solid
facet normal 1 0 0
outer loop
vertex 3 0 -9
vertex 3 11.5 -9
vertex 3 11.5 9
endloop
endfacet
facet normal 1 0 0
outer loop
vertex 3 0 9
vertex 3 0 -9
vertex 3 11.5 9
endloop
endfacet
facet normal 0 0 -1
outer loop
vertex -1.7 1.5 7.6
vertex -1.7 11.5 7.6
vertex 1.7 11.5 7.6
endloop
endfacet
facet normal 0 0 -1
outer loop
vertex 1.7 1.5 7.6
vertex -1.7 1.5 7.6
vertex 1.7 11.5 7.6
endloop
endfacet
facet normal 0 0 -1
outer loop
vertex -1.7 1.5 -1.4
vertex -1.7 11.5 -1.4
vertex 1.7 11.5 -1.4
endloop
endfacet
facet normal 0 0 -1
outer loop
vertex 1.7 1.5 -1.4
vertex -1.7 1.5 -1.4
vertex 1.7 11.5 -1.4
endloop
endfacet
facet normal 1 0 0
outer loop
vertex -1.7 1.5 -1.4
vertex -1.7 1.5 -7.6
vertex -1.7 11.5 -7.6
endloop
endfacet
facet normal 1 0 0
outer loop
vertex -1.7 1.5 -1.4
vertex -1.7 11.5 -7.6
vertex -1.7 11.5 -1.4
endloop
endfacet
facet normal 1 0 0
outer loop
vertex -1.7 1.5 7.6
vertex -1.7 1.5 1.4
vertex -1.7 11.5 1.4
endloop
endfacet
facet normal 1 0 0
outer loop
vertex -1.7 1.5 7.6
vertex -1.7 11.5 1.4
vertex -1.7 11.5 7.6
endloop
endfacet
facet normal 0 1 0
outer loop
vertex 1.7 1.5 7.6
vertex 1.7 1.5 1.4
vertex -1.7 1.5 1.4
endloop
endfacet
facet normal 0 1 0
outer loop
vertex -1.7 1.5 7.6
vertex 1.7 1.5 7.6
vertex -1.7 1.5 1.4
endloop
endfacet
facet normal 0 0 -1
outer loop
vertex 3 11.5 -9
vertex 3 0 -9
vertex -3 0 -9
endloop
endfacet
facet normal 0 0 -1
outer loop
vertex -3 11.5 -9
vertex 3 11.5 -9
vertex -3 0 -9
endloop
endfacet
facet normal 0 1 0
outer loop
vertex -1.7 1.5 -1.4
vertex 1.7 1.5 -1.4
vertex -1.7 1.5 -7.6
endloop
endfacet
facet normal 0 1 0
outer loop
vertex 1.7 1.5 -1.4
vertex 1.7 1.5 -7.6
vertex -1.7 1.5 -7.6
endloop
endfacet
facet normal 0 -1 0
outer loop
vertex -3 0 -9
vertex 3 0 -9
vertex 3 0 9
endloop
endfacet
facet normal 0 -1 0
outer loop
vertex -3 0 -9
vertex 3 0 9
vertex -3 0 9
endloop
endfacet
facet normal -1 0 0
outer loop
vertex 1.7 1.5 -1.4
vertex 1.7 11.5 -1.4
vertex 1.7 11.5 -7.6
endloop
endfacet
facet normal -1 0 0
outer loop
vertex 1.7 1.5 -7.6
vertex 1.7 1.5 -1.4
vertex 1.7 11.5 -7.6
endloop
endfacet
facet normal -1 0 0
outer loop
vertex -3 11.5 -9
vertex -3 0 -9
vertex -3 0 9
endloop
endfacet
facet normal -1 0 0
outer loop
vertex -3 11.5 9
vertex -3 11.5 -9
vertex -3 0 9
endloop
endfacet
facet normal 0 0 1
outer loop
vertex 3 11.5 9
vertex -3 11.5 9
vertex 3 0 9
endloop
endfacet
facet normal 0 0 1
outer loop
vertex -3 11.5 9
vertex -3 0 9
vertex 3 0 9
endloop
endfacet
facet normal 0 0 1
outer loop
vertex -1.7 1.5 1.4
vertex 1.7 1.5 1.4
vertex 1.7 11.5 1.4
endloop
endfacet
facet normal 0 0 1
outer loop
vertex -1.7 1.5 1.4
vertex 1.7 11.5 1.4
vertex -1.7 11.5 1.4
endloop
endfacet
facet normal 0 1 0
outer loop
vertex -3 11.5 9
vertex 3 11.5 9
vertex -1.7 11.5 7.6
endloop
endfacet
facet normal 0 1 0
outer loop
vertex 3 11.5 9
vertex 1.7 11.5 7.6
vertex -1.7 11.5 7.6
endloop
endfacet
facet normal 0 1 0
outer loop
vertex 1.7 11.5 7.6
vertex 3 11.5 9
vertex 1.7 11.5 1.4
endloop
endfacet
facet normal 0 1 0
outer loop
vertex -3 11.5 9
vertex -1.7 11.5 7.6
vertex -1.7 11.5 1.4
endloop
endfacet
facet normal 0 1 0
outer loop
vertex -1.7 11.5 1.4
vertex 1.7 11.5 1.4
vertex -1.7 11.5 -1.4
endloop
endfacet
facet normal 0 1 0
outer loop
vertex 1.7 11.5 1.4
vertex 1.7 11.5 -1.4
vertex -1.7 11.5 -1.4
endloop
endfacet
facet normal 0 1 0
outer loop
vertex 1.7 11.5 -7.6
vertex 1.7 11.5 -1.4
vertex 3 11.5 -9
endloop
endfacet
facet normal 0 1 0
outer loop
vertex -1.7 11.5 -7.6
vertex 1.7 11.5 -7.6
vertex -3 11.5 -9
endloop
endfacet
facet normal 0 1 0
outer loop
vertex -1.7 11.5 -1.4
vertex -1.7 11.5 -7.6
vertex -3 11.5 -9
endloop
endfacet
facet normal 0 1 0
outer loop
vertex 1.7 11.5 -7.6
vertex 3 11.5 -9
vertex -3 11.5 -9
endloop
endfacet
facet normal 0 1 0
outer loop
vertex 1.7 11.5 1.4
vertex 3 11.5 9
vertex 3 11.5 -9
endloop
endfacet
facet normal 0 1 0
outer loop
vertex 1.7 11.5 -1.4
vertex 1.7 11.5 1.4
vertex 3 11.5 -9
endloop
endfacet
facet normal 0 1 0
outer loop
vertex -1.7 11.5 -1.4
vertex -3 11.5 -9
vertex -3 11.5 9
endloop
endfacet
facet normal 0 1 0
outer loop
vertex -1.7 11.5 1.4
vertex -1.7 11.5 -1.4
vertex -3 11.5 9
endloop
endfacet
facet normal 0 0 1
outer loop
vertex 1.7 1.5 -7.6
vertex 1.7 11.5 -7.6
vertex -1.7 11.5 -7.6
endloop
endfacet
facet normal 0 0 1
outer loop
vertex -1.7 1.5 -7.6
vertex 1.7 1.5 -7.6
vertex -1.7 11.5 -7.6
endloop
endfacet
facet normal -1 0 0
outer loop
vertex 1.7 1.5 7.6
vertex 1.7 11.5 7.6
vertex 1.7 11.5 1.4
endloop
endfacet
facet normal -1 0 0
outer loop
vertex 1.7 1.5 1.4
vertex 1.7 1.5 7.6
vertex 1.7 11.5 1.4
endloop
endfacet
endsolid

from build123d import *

# Parameters (mm, degrees)
BOSS_EXTRUDE1_DEPTH = 1.5
BOSS_EXTRUDE5_DEPTH = 10
SKETCH2_W           = 2.8
SKETCH2_H           = 2.8
BOSS_EXTRUDE2_DEPTH = 10
SKETCH4_W           = 6
SKETCH4_H           = 6
CUT_EXTRUDE1_DEPTH  = 12.5
BOSS_EXTRUDE6_DEPTH = 11.5
SKETCH8_W           = 6
SKETCH8_H           = 6
CUT_EXTRUDE3_DEPTH  = 12.5
BOSS_EXTRUDE8_DEPTH = 10


with BuildPart() as part:
    # Sketch1 → Boss-Extrude1 (new body)
    with BuildSketch(Plane(origin=(0, 0, 0), x_dir=(1, 0, 0), z_dir=(0, 1, 0))):
        Polygon((-3, 3), (-3, 9), (3, 9), (3, 3), (9, 3), (9, -3), (3, -3), (3, -9), (-3, -9), (-3, -3), (-9, -3), (-9, 3), align=None)
    extrude(amount=BOSS_EXTRUDE1_DEPTH)

    # Sketch3 → Boss-Extrude5 (add)
    with BuildSketch(Plane(origin=(0, 1.5, 0), x_dir=(1, 0, 0), z_dir=(0, 1, 0))):
        Polygon((-3, 3), (-9, 3), (-9, -3), (-3, -3), (-3, -9), (3, -9), (3, -3), (9, -3), (9, 3), (3, 3), (3, 9), (-3, 9), align=None)
        Polygon((-1.7, 1.7), (-7.6, 1.7), (-7.6, -1.7), (-1.7, -1.7), (-1.7, -7.6), (1.7, -7.6), (1.7, -1.7), (7.6, -1.7), (7.6, 1.7), (1.7, 1.7), (1.7, 7.6), (-1.7, 7.6), align=None, mode=Mode.SUBTRACT)
    extrude(amount=BOSS_EXTRUDE5_DEPTH)

    # Sketch2 → Boss-Extrude2 (add)
    with BuildSketch(Plane(origin=(0, 1.5, 0), x_dir=(1, 0, 0), z_dir=(0, 1, 0))):
        Rectangle(SKETCH2_W, SKETCH2_H)
    extrude(amount=BOSS_EXTRUDE2_DEPTH)

    # Sketch4 → Cut-Extrude1 (cut, through all)
    with BuildSketch(Plane(origin=(0, 11.5, 0), x_dir=(1, 0, 0), z_dir=(0, 1, 0))):
        with Locations((-6, 0)):
            Rectangle(SKETCH4_W, SKETCH4_H)
    extrude(amount=-CUT_EXTRUDE1_DEPTH, mode=Mode.SUBTRACT)

    # Sketch5 → Boss-Extrude6 (add)
    with BuildSketch(Plane(origin=(0, 11.5, 0), x_dir=(1, 0, 0), z_dir=(0, 1, 0))):
        Polygon((-3, 1.7), (-1.7, 1.7), (-1.7, 1.4), (-1.4, 1.4), (-1.4, -1.4), (-1.7, -1.4), (-1.7, -1.7), (-3, -1.7), align=None)
    extrude(amount=-BOSS_EXTRUDE6_DEPTH)

    # Sketch8 → Cut-Extrude3 (cut, through all)
    with BuildSketch(Plane(origin=(0, 11.5, 0), x_dir=(1, 0, 0), z_dir=(0, 1, 0))):
        with Locations((6, 0)):
            Rectangle(SKETCH8_W, SKETCH8_H)
    extrude(amount=-CUT_EXTRUDE3_DEPTH, mode=Mode.SUBTRACT)

    # Sketch9 → Boss-Extrude8 (add)
    with BuildSketch(Plane(origin=(0, 11.5, 0), x_dir=(1, 0, 0), z_dir=(0, 1, 0))):
        Polygon((1.4, -1.4), (1.4, 1.4), (1.7, 1.4), (1.7, 1.7), (3, 1.7), (3, -1.7), (1.7, -1.7), (1.7, -1.4), align=None)
    extrude(amount=-BOSS_EXTRUDE8_DEPTH)


solid = part.part
